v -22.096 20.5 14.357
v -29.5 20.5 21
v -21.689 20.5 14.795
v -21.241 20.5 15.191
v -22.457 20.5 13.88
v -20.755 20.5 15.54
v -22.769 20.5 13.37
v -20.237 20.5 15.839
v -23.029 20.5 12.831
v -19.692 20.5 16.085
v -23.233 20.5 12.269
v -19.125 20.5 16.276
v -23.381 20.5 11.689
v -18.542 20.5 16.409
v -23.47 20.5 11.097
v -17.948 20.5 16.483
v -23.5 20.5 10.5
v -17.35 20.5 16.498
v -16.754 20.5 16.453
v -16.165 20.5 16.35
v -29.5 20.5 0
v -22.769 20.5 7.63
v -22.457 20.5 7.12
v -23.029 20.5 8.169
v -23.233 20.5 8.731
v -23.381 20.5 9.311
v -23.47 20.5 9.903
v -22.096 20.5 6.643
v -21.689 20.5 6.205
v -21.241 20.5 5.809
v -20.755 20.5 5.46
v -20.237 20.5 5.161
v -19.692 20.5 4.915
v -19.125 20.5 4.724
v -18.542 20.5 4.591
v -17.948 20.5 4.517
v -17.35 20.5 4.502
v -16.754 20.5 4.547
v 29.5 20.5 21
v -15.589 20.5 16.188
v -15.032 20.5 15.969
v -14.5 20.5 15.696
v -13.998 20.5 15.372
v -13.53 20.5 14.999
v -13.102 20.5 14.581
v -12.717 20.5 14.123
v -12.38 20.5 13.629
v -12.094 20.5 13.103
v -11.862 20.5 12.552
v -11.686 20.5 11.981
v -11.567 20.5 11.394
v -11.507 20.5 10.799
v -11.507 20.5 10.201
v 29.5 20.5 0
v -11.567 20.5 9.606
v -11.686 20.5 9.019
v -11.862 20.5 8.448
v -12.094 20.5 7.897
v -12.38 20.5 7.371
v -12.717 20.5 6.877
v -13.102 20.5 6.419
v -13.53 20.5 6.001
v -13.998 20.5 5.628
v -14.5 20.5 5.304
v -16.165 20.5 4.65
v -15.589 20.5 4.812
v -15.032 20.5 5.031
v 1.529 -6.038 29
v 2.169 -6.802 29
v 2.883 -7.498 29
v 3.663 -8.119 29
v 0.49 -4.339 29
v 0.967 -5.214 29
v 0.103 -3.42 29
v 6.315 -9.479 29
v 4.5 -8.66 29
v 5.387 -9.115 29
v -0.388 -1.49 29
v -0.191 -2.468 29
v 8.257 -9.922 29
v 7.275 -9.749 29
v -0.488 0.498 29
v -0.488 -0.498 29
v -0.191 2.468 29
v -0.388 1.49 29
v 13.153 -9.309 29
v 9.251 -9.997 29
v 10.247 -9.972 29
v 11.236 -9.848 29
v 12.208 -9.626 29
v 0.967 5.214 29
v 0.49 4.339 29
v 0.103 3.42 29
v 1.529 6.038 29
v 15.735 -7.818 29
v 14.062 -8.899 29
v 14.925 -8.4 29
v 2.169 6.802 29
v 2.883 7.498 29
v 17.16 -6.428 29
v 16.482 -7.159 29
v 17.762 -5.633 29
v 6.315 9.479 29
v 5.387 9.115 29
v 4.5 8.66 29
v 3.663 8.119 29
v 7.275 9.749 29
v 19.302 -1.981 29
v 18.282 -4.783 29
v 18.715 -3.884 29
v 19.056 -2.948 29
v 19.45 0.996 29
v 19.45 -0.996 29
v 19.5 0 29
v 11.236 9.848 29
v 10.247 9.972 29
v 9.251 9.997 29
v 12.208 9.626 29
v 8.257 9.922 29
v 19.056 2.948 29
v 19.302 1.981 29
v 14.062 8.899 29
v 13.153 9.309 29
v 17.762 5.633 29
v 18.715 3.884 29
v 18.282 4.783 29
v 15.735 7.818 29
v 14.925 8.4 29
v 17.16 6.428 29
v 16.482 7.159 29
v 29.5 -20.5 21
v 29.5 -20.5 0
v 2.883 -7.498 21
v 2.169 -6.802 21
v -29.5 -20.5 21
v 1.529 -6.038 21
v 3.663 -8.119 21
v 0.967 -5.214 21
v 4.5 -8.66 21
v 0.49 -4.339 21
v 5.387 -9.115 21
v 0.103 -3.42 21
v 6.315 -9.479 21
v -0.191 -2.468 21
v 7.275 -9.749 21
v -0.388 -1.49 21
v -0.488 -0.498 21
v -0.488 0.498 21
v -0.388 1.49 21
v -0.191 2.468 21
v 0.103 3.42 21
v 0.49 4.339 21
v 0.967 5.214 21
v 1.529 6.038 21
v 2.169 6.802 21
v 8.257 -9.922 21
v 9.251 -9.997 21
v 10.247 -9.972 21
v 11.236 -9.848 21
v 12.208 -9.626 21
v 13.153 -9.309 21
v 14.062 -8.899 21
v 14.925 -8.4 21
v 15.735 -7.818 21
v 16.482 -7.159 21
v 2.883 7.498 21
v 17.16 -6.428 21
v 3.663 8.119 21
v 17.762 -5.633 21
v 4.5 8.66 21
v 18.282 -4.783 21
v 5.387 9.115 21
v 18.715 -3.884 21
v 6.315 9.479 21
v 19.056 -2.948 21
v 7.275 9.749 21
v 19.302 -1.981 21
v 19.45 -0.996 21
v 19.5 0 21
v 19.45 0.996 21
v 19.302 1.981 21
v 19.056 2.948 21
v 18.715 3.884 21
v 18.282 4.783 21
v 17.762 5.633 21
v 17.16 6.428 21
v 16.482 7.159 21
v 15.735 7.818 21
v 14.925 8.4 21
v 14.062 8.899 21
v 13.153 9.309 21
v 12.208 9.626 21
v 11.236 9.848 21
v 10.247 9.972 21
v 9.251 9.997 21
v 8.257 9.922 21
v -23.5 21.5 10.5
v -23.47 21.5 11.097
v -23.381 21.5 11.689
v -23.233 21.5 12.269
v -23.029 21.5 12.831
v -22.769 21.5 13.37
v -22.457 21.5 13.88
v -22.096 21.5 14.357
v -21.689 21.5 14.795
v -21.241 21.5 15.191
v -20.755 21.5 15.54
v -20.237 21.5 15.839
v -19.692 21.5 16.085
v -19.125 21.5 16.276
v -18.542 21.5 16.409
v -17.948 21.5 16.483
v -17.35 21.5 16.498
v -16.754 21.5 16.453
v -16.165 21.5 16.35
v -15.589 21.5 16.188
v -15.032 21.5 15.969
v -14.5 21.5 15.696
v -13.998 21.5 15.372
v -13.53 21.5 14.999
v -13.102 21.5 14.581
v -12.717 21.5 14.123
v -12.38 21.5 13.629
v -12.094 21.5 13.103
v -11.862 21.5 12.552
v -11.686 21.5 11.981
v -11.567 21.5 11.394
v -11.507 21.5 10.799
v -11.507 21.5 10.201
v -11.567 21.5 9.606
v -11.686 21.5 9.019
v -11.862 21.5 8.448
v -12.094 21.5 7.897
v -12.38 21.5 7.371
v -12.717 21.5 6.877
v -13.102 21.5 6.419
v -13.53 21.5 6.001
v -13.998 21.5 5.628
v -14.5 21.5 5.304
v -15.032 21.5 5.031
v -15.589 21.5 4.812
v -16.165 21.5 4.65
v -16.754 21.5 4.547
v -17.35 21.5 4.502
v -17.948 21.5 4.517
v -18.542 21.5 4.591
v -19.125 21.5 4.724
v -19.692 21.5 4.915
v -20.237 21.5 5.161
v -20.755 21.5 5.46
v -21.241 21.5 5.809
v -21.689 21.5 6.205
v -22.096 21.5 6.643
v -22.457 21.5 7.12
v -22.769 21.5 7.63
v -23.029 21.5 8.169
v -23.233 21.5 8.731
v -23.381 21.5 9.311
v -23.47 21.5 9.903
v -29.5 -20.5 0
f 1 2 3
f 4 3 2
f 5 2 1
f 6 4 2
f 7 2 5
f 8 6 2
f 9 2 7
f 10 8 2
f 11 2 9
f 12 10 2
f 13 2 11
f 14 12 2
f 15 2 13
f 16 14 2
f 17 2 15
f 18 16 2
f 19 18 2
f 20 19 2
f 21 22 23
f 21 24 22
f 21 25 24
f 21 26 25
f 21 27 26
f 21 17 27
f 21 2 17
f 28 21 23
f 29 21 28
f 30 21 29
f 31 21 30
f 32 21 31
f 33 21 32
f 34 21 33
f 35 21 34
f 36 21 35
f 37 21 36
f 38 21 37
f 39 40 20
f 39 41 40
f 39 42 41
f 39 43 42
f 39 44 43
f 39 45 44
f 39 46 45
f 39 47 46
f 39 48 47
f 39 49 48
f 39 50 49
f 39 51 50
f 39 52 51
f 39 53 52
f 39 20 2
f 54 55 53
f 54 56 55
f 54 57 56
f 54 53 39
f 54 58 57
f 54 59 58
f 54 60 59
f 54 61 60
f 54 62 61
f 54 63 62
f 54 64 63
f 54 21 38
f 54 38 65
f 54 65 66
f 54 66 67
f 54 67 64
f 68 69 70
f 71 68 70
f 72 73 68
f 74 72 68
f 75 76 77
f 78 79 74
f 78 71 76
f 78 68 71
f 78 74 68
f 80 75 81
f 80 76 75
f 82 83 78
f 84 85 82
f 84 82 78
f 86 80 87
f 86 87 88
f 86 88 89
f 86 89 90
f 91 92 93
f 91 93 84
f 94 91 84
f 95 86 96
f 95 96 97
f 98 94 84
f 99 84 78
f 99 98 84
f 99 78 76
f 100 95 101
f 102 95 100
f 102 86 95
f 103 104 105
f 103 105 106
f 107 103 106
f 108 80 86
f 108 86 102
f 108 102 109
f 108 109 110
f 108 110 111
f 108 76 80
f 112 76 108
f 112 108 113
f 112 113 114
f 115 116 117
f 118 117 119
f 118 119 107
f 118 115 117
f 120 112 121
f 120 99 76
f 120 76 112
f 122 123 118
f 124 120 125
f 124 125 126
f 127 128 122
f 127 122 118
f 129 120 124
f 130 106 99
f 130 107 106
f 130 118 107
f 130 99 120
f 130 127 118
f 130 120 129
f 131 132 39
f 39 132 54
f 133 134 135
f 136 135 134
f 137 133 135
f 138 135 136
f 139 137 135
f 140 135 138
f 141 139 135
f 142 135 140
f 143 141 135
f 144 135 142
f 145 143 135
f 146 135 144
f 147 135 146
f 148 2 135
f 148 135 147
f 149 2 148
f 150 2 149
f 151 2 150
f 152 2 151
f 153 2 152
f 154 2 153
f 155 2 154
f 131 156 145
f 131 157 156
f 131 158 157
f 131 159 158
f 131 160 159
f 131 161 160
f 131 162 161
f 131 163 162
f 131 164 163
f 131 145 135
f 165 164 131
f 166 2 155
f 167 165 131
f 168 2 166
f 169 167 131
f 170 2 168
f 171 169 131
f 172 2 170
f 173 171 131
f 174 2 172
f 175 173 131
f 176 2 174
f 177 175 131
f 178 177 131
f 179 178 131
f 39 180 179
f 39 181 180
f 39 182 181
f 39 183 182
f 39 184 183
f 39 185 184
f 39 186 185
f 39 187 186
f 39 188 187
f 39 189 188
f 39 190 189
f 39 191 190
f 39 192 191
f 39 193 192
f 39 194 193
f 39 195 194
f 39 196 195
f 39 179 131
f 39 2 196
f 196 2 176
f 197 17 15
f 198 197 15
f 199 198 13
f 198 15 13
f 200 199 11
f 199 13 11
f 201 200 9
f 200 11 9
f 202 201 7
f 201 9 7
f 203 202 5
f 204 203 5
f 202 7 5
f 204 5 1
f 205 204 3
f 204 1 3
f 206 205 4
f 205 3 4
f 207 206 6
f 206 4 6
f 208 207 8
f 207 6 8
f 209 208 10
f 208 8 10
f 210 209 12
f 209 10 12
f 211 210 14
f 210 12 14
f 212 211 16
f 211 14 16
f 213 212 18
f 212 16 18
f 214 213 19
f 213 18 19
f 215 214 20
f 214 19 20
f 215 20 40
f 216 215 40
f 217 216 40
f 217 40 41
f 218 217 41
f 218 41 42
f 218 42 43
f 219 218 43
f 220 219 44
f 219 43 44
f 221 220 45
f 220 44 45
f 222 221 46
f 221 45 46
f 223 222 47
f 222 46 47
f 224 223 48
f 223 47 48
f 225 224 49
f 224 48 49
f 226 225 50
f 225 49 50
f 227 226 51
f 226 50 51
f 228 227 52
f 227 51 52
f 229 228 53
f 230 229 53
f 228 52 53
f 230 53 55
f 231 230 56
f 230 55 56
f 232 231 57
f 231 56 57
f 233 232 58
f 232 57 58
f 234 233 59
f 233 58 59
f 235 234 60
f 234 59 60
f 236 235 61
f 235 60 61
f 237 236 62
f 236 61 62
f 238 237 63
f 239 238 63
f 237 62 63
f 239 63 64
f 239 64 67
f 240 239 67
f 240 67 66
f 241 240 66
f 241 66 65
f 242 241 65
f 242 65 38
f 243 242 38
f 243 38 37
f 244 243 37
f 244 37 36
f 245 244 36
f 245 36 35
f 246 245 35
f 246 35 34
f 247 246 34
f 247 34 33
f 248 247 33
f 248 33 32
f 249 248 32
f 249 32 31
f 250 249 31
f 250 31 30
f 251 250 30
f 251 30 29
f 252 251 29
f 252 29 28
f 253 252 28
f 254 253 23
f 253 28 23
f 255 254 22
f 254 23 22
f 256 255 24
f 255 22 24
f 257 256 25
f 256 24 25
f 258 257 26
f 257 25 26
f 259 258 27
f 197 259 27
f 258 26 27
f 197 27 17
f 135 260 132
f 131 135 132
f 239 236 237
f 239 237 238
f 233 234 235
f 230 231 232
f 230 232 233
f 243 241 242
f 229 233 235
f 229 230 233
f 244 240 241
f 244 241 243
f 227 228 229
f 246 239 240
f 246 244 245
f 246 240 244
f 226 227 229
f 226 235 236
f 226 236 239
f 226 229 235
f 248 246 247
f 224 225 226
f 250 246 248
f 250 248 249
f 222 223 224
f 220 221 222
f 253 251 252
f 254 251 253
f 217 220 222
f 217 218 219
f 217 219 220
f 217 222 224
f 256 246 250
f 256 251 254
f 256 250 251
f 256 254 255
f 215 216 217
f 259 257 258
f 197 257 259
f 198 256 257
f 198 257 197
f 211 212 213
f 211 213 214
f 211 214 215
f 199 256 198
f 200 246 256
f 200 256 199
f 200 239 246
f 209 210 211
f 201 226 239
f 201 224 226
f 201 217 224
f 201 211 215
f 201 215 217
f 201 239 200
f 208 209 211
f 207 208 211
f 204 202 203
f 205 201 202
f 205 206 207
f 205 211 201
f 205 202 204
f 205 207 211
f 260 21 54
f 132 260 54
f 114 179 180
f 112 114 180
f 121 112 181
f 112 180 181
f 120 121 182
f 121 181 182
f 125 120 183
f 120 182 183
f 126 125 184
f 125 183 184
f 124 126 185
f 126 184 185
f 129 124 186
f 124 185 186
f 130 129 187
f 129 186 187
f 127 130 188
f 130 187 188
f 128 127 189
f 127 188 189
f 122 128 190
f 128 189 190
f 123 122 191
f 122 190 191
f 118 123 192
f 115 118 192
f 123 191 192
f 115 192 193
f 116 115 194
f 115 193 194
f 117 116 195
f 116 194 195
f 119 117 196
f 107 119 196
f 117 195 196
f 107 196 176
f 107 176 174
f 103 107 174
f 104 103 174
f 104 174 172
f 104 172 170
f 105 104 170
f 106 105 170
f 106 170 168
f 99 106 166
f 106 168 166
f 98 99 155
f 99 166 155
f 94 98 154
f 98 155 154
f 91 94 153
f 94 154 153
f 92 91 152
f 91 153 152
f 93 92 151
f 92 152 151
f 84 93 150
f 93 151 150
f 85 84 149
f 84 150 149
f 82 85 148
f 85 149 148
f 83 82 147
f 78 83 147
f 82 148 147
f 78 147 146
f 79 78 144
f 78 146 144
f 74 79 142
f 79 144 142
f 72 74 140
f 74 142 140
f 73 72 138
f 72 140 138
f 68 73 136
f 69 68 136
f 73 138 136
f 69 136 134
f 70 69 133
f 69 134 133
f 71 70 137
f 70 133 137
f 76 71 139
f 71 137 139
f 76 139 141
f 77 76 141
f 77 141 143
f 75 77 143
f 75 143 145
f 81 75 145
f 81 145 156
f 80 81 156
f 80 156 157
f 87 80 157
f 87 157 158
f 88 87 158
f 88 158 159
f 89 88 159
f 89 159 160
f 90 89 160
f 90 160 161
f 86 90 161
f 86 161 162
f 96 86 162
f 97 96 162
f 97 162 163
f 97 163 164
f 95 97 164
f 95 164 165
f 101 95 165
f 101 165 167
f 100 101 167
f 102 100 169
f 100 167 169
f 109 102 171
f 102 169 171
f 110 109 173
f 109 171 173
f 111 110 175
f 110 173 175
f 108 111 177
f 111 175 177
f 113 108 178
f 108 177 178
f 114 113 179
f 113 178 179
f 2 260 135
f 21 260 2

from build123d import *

# Parameters (mm, degrees)
F0_W     = 59
F0_H     = 41
F1_DEPTH = 21
F2_R     = 10
F3_DEPTH = 8
F4_R     = 6
F5_DEPTH = 1


with BuildPart() as f1:
    # F0 (on Top) → F1 (new body)
    with BuildSketch(Plane.XY):
        Rectangle(F0_W, F0_H)
    extrude(amount=F1_DEPTH)

    # F2 (on face) → F3 (join)
    with BuildSketch(Plane.XY.offset(21)):
        with Locations((9.5, 0)):
            Circle(F2_R)
    extrude(amount=F3_DEPTH)

    # F4 (on face) → F5 (join)
    with BuildSketch(Plane(origin=(0, 20.5, 0), x_dir=(-1, 0, 0), z_dir=(0, 1, 0))):
        with Locations((17.5, 10.5)):
            Circle(F4_R)
    extrude(amount=F5_DEPTH)


solid = f1.part
